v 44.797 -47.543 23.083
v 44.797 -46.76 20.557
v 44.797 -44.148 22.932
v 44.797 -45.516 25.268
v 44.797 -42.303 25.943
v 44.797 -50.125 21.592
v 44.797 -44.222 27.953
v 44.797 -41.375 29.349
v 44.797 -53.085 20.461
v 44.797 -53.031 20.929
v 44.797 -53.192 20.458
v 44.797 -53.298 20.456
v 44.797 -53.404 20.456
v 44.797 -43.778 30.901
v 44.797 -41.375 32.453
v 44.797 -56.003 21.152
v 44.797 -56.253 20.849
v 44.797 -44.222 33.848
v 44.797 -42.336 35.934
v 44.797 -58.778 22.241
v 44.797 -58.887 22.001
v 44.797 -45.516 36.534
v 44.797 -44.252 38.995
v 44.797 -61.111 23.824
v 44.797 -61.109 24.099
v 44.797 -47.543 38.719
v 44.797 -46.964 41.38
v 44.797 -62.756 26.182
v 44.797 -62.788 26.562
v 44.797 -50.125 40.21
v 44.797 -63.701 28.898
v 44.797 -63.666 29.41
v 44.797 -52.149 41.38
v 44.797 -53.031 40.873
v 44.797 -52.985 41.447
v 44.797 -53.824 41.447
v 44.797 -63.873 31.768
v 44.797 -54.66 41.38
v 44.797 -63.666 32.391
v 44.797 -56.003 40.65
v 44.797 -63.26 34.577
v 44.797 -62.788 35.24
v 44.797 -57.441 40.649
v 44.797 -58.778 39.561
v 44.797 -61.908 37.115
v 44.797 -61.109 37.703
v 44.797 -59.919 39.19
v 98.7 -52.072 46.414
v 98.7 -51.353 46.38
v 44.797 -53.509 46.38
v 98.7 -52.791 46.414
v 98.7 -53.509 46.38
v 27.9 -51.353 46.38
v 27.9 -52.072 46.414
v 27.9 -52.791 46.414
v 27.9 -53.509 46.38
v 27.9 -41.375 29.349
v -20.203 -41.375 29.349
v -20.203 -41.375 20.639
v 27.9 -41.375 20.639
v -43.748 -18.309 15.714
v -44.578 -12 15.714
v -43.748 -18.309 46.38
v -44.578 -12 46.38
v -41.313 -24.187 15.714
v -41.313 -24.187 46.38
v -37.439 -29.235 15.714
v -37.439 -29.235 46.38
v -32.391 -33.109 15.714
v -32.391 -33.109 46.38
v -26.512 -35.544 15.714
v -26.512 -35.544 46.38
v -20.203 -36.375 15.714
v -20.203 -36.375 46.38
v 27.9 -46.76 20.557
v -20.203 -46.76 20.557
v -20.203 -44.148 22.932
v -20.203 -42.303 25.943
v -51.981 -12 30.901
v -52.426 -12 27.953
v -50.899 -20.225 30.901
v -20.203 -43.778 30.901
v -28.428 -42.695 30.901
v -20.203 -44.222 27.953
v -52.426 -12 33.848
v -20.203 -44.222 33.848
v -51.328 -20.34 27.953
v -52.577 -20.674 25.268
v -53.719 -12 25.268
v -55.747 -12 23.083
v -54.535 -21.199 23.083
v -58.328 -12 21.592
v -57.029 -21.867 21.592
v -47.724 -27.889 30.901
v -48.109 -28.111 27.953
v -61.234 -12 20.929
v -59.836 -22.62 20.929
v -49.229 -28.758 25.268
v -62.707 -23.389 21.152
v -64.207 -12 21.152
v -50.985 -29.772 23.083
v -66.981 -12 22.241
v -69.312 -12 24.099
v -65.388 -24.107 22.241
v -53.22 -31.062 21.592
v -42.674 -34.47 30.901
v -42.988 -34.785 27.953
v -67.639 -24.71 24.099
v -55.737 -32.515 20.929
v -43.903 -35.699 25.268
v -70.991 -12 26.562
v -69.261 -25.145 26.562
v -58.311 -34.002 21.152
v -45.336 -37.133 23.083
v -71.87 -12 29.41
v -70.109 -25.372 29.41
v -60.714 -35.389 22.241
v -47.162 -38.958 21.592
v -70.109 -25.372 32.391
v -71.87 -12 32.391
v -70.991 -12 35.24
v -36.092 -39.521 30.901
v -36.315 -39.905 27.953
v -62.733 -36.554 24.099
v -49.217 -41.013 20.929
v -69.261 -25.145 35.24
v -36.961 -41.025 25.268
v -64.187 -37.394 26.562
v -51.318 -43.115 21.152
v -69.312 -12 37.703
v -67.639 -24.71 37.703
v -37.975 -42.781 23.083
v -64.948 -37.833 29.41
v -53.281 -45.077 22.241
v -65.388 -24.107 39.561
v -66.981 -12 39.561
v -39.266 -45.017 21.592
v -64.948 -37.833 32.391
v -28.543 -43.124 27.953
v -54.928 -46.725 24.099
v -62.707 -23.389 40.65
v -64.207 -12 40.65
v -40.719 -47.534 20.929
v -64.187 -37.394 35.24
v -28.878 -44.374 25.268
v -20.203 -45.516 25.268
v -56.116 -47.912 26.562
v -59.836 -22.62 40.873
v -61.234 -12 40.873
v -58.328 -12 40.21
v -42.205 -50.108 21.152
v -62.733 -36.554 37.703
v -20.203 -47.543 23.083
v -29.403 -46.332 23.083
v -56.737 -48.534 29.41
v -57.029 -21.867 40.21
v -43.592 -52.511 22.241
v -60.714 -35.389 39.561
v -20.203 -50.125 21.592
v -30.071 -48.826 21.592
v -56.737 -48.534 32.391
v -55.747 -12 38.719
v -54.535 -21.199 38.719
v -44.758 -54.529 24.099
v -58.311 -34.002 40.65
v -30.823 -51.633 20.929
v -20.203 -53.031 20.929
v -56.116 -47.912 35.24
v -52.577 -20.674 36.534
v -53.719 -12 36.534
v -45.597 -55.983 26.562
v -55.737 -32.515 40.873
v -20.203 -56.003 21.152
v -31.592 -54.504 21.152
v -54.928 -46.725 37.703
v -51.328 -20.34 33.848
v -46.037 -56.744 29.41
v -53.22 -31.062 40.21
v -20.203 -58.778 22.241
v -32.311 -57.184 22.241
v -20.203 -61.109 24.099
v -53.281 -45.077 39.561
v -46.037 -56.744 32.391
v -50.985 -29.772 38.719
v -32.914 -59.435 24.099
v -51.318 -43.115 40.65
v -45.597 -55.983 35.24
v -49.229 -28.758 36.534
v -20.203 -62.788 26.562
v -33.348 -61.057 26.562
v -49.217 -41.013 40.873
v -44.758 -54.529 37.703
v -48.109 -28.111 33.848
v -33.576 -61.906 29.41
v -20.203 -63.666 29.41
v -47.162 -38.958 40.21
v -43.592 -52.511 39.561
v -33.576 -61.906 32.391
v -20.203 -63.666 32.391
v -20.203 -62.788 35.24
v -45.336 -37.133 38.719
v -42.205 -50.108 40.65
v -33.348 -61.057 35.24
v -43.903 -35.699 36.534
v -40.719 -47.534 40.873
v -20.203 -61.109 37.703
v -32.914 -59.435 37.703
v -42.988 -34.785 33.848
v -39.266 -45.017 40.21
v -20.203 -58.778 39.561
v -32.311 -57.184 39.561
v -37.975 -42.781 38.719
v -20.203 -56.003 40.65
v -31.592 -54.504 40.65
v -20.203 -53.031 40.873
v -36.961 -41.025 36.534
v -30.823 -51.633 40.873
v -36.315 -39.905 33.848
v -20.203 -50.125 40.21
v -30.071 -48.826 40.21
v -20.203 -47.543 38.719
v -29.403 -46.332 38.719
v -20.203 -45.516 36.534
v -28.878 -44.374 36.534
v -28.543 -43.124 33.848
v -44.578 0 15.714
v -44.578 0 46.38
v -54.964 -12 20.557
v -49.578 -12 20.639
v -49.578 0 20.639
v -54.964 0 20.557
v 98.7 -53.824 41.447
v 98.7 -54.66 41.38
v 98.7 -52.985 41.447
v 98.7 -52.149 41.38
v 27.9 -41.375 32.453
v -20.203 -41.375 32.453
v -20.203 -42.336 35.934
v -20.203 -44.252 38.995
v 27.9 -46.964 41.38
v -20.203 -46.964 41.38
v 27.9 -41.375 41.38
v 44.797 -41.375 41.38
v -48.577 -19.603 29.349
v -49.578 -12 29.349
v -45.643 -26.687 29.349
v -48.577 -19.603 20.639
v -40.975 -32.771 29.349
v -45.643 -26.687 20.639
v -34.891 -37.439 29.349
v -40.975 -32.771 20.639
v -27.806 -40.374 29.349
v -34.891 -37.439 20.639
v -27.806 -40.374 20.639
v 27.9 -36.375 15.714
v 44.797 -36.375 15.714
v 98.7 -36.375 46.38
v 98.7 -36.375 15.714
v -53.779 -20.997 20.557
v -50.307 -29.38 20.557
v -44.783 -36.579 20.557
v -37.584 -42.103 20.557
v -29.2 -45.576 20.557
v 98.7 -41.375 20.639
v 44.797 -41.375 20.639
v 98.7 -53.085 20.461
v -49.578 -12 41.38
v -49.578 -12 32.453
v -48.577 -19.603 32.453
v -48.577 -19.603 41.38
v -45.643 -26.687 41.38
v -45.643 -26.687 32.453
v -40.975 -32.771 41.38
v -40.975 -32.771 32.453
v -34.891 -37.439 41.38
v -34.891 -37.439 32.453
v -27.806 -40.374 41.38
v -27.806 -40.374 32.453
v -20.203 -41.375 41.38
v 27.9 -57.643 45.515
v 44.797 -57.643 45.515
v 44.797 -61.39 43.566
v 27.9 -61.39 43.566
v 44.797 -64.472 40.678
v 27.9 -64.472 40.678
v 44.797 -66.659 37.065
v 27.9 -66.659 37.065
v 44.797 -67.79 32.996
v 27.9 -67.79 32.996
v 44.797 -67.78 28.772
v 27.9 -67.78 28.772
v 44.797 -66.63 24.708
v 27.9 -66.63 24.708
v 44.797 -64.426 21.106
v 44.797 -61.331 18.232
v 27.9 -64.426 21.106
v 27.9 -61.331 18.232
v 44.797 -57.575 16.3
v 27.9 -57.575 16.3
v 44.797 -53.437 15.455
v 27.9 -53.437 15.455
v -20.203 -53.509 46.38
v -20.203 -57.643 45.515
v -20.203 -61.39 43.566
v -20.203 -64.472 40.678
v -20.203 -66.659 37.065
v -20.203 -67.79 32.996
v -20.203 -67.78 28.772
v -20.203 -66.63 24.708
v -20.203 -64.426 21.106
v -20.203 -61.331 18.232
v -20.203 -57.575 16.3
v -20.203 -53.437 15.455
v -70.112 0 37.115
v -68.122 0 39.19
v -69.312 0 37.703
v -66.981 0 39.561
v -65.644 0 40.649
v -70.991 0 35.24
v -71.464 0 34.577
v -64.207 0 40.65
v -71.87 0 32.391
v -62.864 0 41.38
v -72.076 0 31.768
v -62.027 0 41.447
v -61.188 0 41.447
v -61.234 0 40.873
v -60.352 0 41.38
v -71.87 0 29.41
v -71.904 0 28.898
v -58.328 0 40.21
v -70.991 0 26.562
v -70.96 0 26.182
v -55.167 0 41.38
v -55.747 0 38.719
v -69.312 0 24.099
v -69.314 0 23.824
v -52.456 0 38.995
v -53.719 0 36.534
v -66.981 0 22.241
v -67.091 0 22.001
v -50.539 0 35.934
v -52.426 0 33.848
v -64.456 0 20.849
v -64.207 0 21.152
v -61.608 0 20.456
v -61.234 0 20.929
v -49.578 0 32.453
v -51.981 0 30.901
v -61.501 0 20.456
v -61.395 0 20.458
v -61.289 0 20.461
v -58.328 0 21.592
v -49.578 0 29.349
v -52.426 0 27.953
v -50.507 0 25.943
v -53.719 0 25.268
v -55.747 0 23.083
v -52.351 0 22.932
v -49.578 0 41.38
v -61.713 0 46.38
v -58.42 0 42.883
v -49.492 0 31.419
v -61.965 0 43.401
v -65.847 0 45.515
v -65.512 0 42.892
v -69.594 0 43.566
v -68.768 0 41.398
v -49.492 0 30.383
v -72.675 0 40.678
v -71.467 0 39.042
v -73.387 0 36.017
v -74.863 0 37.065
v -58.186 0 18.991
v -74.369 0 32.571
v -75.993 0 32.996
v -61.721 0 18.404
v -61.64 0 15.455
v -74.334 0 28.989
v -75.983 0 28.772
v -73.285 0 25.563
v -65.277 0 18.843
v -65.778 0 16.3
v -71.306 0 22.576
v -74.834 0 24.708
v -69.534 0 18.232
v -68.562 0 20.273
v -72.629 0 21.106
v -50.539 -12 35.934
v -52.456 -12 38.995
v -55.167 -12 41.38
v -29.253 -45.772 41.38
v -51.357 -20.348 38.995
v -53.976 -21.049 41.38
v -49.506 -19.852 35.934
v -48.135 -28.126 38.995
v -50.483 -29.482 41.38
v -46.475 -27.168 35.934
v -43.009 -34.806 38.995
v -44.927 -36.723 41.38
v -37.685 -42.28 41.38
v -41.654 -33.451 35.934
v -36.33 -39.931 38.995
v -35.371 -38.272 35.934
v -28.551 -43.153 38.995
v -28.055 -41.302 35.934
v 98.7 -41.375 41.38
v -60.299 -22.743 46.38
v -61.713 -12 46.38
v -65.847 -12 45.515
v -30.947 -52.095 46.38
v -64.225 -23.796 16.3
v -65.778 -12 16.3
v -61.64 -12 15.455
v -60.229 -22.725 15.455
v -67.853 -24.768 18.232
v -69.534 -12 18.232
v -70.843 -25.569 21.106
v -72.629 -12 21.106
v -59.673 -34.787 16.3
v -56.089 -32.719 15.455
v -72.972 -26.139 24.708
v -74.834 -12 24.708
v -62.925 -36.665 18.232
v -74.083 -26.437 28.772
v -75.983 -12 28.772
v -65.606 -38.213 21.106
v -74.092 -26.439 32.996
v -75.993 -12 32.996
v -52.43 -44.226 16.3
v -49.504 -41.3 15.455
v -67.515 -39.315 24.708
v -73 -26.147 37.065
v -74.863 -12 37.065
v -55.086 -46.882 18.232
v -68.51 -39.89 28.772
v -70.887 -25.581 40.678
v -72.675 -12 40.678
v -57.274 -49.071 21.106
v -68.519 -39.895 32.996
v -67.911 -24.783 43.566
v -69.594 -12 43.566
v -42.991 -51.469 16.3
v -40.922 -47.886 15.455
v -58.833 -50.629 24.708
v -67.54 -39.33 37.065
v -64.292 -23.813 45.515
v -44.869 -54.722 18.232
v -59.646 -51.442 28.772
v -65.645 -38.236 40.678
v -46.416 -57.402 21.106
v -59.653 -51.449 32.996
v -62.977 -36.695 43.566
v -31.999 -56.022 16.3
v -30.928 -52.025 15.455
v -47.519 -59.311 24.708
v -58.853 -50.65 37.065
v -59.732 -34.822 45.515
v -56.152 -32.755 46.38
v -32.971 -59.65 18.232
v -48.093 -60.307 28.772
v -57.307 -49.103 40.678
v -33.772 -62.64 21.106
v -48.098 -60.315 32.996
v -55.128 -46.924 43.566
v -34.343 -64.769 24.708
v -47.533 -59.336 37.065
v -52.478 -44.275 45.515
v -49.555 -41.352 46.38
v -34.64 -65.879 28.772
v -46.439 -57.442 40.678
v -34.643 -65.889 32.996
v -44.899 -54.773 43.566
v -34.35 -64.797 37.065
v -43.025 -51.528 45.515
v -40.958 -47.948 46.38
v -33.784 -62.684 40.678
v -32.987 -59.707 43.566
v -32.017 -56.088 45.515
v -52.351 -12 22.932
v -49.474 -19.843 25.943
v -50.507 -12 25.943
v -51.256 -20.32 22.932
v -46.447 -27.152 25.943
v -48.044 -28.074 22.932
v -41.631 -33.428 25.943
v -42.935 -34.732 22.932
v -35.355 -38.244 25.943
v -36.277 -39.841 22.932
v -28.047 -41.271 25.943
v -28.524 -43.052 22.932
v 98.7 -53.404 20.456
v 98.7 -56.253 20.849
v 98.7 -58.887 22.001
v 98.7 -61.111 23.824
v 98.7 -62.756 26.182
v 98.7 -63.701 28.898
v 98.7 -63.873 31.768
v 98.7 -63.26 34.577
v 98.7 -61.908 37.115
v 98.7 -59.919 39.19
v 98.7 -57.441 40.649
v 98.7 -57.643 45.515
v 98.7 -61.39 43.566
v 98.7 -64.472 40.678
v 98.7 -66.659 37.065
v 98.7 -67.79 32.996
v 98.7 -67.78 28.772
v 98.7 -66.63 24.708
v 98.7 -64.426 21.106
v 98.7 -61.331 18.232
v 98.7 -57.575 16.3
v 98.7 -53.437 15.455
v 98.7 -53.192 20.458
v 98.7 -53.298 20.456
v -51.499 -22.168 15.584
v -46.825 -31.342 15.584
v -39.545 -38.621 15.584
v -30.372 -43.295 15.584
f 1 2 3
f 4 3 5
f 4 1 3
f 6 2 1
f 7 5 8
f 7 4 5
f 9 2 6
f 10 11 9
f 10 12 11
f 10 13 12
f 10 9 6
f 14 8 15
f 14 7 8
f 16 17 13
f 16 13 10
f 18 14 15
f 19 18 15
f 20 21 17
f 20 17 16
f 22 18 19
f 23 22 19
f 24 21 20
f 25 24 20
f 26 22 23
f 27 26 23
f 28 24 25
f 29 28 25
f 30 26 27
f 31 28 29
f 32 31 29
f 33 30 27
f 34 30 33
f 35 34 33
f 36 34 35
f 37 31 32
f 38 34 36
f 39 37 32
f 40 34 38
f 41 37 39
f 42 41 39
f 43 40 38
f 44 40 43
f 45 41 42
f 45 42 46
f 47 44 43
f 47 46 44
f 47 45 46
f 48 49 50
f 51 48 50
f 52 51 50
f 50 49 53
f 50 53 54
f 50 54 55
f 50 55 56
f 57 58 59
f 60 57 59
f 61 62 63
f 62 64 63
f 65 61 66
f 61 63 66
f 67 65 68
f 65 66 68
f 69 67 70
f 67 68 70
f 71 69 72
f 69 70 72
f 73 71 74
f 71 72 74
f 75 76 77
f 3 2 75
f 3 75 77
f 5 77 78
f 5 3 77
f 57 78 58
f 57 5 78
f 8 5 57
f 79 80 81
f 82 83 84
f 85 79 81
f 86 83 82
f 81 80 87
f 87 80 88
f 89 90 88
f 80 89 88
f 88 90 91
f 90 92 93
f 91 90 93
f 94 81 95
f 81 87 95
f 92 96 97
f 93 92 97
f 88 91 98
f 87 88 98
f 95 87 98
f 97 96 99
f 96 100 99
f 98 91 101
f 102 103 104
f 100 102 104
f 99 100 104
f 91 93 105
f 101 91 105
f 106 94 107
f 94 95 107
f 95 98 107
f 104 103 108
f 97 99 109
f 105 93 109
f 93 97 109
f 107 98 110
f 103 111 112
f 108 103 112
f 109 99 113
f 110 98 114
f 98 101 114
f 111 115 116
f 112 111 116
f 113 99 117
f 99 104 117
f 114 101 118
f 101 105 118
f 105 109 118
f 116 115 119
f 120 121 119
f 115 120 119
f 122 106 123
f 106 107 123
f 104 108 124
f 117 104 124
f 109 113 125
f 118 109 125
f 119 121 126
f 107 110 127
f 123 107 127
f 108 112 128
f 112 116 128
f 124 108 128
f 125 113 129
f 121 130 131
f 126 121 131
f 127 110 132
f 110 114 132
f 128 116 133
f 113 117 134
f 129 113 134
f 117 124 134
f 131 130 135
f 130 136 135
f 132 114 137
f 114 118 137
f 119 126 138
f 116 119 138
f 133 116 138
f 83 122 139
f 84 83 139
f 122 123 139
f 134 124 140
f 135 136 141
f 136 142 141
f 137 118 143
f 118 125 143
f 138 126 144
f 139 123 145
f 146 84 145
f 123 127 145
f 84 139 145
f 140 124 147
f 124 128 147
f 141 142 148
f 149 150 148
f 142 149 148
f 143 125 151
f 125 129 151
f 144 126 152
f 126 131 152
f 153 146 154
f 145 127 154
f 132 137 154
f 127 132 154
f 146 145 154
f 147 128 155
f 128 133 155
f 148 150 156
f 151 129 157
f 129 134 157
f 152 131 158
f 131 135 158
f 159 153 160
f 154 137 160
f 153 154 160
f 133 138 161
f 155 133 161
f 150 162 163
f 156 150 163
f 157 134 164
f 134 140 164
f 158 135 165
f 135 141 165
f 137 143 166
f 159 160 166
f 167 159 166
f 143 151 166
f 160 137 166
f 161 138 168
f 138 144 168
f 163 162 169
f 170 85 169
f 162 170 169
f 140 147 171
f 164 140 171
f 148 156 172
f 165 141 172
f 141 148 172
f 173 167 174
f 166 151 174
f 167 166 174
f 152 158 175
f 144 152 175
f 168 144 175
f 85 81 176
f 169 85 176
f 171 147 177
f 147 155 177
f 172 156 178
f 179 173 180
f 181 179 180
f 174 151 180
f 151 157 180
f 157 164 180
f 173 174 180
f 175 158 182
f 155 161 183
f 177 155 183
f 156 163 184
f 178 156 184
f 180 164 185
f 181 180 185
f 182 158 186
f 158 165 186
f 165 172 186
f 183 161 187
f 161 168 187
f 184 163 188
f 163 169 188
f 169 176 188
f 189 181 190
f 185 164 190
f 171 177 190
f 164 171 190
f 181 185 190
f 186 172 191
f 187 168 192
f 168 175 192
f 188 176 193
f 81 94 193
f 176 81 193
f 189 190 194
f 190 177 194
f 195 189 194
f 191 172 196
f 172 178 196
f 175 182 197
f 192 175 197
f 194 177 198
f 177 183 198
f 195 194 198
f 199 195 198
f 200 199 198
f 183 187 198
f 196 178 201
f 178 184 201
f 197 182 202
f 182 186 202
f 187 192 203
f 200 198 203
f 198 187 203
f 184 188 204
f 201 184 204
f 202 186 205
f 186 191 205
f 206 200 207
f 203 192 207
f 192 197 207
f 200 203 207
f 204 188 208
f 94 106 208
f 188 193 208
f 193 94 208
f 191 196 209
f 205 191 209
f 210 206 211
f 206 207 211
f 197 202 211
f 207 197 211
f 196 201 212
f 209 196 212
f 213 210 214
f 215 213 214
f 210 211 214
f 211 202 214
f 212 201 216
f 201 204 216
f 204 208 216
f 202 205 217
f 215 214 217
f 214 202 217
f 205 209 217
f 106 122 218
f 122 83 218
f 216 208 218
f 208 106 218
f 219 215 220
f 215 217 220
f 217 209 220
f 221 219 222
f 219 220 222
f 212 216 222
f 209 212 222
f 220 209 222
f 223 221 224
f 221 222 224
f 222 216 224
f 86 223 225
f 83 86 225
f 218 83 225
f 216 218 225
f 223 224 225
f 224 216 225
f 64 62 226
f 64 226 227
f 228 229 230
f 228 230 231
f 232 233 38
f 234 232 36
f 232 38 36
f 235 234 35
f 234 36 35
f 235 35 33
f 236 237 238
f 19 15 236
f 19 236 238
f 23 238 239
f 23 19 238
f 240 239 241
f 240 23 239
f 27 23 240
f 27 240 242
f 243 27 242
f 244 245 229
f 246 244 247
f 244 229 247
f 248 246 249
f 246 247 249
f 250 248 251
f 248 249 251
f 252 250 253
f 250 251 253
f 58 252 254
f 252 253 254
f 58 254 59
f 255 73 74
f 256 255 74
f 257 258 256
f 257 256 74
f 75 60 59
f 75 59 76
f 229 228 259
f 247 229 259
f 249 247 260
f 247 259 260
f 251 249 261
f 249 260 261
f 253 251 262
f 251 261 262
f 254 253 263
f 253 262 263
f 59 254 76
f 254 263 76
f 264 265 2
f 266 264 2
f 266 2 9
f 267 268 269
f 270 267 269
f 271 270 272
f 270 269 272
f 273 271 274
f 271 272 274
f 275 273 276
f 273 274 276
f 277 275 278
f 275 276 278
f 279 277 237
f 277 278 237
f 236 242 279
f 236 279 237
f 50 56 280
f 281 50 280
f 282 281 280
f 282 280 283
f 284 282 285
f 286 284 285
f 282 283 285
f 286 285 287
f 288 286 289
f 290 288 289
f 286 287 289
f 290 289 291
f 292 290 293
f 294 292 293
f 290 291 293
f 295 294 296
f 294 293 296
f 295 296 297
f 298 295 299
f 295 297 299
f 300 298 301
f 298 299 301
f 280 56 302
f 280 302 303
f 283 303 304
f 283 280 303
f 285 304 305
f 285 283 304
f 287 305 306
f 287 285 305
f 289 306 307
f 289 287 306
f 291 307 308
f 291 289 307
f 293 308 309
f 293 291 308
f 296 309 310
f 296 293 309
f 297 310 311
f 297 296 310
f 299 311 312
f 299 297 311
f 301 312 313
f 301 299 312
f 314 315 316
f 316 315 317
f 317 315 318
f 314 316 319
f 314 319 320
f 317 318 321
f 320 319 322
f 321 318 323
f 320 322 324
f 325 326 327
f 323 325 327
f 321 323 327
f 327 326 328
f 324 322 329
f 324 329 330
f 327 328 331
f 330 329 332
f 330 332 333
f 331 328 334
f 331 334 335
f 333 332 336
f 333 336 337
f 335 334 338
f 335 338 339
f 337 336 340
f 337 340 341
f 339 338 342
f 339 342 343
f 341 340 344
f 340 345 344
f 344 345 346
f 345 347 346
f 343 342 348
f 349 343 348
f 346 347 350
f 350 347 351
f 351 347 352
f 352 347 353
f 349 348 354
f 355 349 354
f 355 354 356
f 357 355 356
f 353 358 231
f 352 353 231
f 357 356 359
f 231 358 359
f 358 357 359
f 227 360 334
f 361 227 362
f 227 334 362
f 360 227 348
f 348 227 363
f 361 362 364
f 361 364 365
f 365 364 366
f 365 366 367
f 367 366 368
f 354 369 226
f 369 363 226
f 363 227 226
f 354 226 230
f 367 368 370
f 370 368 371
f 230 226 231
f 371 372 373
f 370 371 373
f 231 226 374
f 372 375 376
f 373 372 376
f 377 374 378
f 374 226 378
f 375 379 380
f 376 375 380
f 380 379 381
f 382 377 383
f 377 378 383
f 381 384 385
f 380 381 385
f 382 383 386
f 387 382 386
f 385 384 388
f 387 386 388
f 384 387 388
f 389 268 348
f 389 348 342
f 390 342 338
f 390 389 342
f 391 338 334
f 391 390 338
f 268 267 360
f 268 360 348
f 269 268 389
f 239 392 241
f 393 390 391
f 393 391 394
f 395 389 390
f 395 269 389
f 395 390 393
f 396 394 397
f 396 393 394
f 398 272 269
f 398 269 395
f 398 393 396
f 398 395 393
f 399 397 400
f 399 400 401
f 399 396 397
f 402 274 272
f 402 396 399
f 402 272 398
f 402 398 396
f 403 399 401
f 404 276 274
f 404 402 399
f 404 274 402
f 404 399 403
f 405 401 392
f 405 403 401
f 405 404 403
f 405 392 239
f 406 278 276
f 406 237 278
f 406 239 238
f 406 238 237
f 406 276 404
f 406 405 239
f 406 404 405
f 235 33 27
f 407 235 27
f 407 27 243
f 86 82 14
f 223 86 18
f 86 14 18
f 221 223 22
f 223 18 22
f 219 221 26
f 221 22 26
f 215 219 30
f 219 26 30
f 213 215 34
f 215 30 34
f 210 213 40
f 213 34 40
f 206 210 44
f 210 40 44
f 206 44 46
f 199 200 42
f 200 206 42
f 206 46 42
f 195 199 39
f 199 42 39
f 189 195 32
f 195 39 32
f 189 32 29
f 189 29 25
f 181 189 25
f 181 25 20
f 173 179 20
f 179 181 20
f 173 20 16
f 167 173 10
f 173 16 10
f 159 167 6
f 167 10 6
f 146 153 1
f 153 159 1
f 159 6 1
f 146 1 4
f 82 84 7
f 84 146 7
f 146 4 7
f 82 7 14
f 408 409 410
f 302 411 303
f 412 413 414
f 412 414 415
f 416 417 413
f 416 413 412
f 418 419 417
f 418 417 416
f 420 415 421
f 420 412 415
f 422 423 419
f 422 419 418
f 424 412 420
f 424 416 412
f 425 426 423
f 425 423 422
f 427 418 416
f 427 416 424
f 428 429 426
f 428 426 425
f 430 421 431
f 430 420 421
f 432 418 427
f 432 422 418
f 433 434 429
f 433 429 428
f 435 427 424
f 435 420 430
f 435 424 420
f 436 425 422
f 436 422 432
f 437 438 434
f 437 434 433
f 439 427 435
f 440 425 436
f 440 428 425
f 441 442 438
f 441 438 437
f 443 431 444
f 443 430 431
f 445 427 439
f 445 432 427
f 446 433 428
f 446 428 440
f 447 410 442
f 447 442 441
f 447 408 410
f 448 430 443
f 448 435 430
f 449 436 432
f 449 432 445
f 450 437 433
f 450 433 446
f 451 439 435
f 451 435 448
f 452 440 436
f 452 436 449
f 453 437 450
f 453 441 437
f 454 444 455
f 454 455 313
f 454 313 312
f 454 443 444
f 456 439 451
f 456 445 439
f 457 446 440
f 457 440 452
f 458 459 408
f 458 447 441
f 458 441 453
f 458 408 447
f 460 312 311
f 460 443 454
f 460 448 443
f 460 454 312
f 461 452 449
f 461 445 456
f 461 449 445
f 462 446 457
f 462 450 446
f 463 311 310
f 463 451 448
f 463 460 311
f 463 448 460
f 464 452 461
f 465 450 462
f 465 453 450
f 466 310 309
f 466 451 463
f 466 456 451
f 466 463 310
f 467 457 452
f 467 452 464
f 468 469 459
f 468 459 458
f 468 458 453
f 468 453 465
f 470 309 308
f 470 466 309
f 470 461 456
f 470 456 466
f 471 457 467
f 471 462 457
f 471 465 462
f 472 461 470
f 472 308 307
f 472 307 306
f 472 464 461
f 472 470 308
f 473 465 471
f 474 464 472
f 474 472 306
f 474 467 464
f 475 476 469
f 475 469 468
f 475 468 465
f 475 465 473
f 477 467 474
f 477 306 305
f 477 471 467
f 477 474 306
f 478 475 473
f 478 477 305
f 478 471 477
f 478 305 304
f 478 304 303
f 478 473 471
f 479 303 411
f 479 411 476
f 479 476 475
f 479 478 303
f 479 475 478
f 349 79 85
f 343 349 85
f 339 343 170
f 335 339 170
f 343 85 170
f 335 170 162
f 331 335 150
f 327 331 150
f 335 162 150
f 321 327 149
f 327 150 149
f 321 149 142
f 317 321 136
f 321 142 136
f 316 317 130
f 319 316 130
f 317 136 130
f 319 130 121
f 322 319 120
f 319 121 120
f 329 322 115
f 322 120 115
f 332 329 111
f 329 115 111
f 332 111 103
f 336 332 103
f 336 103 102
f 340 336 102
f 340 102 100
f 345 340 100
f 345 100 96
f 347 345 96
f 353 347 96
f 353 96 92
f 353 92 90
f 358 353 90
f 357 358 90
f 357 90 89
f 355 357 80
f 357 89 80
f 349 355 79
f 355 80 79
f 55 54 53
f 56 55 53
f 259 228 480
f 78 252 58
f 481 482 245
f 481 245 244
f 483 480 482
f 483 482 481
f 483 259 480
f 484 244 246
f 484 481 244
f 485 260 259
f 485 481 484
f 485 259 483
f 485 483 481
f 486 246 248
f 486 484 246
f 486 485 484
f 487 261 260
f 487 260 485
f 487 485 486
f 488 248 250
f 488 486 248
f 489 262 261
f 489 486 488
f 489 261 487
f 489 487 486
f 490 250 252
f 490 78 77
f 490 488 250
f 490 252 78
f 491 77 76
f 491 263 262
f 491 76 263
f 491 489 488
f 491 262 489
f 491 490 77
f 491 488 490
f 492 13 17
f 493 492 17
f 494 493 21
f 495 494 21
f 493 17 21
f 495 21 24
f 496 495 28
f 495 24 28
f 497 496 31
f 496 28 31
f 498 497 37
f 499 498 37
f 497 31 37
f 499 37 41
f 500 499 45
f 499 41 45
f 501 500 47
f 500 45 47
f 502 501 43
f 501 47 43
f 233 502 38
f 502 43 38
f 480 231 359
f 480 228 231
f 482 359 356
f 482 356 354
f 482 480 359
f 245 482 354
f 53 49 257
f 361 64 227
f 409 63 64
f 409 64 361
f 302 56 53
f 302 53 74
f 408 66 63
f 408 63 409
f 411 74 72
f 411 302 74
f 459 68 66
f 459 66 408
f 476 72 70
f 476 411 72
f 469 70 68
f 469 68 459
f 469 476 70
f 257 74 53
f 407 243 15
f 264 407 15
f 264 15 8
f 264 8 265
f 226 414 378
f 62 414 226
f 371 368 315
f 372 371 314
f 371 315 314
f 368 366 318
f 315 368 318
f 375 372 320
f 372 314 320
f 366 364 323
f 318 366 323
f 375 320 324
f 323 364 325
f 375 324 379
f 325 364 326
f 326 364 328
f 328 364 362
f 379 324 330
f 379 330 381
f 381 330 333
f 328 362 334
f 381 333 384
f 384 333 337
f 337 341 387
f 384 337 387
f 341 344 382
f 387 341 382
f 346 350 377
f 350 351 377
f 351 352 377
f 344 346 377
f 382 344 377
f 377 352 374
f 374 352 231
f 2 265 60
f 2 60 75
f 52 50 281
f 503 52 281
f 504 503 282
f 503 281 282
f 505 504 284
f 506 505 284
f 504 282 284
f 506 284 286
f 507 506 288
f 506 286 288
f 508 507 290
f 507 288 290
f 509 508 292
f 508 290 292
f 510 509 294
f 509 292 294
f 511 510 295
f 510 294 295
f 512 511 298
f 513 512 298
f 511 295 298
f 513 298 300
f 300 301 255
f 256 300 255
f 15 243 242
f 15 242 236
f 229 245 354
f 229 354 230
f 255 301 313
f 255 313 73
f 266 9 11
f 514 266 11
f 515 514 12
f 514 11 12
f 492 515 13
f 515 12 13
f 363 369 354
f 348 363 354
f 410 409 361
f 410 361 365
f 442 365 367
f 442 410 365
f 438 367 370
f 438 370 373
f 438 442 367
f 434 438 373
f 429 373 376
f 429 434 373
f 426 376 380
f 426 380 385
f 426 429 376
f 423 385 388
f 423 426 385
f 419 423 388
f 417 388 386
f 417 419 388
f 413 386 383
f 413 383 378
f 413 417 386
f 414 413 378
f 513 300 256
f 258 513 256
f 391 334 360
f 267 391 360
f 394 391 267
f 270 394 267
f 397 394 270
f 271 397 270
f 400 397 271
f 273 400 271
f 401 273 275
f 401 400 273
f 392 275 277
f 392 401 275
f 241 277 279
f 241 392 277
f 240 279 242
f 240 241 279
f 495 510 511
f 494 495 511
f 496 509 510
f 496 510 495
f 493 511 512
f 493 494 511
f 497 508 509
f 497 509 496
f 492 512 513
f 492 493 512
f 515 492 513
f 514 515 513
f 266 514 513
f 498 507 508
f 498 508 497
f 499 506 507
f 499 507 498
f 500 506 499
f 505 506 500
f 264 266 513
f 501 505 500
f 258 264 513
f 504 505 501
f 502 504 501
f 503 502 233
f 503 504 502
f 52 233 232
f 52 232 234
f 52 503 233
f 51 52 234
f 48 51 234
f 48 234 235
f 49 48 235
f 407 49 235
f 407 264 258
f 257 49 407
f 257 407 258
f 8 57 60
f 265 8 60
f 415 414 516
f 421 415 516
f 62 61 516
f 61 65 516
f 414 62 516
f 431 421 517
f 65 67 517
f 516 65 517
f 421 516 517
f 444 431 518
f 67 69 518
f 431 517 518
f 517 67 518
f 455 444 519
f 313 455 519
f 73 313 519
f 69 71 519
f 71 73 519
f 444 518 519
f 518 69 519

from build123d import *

# Parameters (mm, degrees)
F0_R     = 12.5
F0_R_2   = 9.5
F3_T     = -2.5
F5_START = 27.9
F5_DEPTH = 70.8


with BuildPart() as f2:
    # F2: sweep along a path in F1
    with BuildLine(Plane.XY) as f2_path:
        Line((-30.2034914494, 0), (-30.2034914494, -12))
        ThreePointArc((-30.2034914494, -12), (-27.2745592612, -19.0710678119), (-20.2034914494, -22))
        Line((-20.2034914494, -22), (44.7965085506, -22))
    # F0 (on Front) → F2 (sweep)
    with BuildSketch(Plane.XZ):
        with Locations((-61.9814805686, 30.9009179473)):
            Circle(F0_R)
        with Locations((-61.9814805686, 30.9009179473)):
            Circle(F0_R_2, mode=Mode.SUBTRACT)
        with Locations((-61.9814805686, 30.9009179473)):
            Circle(F0_R_2)
    sweep(path=f2_path.line)

    # F3
    f3_openings = [f2.faces().sort_by_distance(p)[0] for p in [
        (44.796509, -53.777989, 30.900918),
        (-61.981481, 0, 30.900918),
    ]]
    offset(amount=F3_T, openings=f3_openings)

    # F4 (on Right) → F5 (join)
    with BuildSketch(Plane.YZ.offset(F5_START)):
        with BuildLine():
            Line((-53.509484202, 46.3802992553), (-51.3534231177, 46.3802992553))
            ThreePointArc((-51.3534231177, 46.3802992553), (-52.4314536598, 46.4178383598), (-53.509484202, 46.3802992553))
        make_face()
        with BuildLine():
            Line((-36.3746711443, 46.3802992553), (-51.3534231177, 46.3802992553))
            Line((-51.3534231177, 46.3802992553), (-53.509484202, 46.3802992553))
            ThreePointArc((-53.509484202, 46.3802992553), (-67.929370479, 30.8835584681), (-53.4370074848, 15.4545756724))
            Line((-53.4370074848, 15.4545756724), (-36.3746711443, 15.7140511985))
            Line((-36.3746711443, 15.7140511985), (-36.3746711443, 46.3802992553))
        make_face()
        with BuildLine():
            ThreePointArc((-54.6600517166, 41.3802992553), (-53.4043908119, 41.4556498275), (-52.1487299073, 41.3802992553))
            Line((-52.1487299073, 41.3802992553), (-41.3746711443, 41.3802992553))
            Line((-41.3746711443, 41.3802992553), (-41.3746711443, 20.6385918219))
            Line((-41.3746711443, 20.6385918219), (-53.0851070952, 20.4605053354))
            ThreePointArc((-53.0851070952, 20.4605053354), (-53.2447304946, 20.4568637746), (-53.4043908119, 20.4556498275))
            ThreePointArc((-53.4043908119, 20.4556498275), (-63.8855362405, 30.3266899686), (-54.6600517166, 41.3802992553))
        make_face(mode=Mode.SUBTRACT)
    extrude(amount=F5_DEPTH)

    # F6: sweep along a path in F1
    with BuildLine(Plane.XY) as f6_path:
        Line((-30.2034914494, 0), (-30.2034914494, -12))
        ThreePointArc((-30.2034914494, -12), (-27.2745592612, -19.0710678119), (-20.2034914494, -22))
        Line((-20.2034914494, -22), (44.7965085506, -22))
    # F4 (on Right) → F6 (sweep)
    with BuildSketch(Plane.YZ):
        with BuildLine():
            Line((-36.3746711443, 46.3802992553), (-51.3534231177, 46.3802992553))
            Line((-51.3534231177, 46.3802992553), (-53.509484202, 46.3802992553))
            ThreePointArc((-53.509484202, 46.3802992553), (-67.929370479, 30.8835584681), (-53.4370074848, 15.4545756724))
            Line((-53.4370074848, 15.4545756724), (-36.3746711443, 15.7140511985))
            Line((-36.3746711443, 15.7140511985), (-36.3746711443, 46.3802992553))
        make_face()
        with BuildLine():
            ThreePointArc((-54.6600517166, 41.3802992553), (-53.4043908119, 41.4556498275), (-52.1487299073, 41.3802992553))
            Line((-52.1487299073, 41.3802992553), (-41.3746711443, 41.3802992553))
            Line((-41.3746711443, 41.3802992553), (-41.3746711443, 20.6385918219))
            Line((-41.3746711443, 20.6385918219), (-53.0851070952, 20.4605053354))
            ThreePointArc((-53.0851070952, 20.4605053354), (-53.2447304946, 20.4568637746), (-53.4043908119, 20.4556498275))
            ThreePointArc((-53.4043908119, 20.4556498275), (-63.8855362405, 30.3266899686), (-54.6600517166, 41.3802992553))
        make_face(mode=Mode.SUBTRACT)
    sweep(path=f6_path.line)


solid = f2.part
